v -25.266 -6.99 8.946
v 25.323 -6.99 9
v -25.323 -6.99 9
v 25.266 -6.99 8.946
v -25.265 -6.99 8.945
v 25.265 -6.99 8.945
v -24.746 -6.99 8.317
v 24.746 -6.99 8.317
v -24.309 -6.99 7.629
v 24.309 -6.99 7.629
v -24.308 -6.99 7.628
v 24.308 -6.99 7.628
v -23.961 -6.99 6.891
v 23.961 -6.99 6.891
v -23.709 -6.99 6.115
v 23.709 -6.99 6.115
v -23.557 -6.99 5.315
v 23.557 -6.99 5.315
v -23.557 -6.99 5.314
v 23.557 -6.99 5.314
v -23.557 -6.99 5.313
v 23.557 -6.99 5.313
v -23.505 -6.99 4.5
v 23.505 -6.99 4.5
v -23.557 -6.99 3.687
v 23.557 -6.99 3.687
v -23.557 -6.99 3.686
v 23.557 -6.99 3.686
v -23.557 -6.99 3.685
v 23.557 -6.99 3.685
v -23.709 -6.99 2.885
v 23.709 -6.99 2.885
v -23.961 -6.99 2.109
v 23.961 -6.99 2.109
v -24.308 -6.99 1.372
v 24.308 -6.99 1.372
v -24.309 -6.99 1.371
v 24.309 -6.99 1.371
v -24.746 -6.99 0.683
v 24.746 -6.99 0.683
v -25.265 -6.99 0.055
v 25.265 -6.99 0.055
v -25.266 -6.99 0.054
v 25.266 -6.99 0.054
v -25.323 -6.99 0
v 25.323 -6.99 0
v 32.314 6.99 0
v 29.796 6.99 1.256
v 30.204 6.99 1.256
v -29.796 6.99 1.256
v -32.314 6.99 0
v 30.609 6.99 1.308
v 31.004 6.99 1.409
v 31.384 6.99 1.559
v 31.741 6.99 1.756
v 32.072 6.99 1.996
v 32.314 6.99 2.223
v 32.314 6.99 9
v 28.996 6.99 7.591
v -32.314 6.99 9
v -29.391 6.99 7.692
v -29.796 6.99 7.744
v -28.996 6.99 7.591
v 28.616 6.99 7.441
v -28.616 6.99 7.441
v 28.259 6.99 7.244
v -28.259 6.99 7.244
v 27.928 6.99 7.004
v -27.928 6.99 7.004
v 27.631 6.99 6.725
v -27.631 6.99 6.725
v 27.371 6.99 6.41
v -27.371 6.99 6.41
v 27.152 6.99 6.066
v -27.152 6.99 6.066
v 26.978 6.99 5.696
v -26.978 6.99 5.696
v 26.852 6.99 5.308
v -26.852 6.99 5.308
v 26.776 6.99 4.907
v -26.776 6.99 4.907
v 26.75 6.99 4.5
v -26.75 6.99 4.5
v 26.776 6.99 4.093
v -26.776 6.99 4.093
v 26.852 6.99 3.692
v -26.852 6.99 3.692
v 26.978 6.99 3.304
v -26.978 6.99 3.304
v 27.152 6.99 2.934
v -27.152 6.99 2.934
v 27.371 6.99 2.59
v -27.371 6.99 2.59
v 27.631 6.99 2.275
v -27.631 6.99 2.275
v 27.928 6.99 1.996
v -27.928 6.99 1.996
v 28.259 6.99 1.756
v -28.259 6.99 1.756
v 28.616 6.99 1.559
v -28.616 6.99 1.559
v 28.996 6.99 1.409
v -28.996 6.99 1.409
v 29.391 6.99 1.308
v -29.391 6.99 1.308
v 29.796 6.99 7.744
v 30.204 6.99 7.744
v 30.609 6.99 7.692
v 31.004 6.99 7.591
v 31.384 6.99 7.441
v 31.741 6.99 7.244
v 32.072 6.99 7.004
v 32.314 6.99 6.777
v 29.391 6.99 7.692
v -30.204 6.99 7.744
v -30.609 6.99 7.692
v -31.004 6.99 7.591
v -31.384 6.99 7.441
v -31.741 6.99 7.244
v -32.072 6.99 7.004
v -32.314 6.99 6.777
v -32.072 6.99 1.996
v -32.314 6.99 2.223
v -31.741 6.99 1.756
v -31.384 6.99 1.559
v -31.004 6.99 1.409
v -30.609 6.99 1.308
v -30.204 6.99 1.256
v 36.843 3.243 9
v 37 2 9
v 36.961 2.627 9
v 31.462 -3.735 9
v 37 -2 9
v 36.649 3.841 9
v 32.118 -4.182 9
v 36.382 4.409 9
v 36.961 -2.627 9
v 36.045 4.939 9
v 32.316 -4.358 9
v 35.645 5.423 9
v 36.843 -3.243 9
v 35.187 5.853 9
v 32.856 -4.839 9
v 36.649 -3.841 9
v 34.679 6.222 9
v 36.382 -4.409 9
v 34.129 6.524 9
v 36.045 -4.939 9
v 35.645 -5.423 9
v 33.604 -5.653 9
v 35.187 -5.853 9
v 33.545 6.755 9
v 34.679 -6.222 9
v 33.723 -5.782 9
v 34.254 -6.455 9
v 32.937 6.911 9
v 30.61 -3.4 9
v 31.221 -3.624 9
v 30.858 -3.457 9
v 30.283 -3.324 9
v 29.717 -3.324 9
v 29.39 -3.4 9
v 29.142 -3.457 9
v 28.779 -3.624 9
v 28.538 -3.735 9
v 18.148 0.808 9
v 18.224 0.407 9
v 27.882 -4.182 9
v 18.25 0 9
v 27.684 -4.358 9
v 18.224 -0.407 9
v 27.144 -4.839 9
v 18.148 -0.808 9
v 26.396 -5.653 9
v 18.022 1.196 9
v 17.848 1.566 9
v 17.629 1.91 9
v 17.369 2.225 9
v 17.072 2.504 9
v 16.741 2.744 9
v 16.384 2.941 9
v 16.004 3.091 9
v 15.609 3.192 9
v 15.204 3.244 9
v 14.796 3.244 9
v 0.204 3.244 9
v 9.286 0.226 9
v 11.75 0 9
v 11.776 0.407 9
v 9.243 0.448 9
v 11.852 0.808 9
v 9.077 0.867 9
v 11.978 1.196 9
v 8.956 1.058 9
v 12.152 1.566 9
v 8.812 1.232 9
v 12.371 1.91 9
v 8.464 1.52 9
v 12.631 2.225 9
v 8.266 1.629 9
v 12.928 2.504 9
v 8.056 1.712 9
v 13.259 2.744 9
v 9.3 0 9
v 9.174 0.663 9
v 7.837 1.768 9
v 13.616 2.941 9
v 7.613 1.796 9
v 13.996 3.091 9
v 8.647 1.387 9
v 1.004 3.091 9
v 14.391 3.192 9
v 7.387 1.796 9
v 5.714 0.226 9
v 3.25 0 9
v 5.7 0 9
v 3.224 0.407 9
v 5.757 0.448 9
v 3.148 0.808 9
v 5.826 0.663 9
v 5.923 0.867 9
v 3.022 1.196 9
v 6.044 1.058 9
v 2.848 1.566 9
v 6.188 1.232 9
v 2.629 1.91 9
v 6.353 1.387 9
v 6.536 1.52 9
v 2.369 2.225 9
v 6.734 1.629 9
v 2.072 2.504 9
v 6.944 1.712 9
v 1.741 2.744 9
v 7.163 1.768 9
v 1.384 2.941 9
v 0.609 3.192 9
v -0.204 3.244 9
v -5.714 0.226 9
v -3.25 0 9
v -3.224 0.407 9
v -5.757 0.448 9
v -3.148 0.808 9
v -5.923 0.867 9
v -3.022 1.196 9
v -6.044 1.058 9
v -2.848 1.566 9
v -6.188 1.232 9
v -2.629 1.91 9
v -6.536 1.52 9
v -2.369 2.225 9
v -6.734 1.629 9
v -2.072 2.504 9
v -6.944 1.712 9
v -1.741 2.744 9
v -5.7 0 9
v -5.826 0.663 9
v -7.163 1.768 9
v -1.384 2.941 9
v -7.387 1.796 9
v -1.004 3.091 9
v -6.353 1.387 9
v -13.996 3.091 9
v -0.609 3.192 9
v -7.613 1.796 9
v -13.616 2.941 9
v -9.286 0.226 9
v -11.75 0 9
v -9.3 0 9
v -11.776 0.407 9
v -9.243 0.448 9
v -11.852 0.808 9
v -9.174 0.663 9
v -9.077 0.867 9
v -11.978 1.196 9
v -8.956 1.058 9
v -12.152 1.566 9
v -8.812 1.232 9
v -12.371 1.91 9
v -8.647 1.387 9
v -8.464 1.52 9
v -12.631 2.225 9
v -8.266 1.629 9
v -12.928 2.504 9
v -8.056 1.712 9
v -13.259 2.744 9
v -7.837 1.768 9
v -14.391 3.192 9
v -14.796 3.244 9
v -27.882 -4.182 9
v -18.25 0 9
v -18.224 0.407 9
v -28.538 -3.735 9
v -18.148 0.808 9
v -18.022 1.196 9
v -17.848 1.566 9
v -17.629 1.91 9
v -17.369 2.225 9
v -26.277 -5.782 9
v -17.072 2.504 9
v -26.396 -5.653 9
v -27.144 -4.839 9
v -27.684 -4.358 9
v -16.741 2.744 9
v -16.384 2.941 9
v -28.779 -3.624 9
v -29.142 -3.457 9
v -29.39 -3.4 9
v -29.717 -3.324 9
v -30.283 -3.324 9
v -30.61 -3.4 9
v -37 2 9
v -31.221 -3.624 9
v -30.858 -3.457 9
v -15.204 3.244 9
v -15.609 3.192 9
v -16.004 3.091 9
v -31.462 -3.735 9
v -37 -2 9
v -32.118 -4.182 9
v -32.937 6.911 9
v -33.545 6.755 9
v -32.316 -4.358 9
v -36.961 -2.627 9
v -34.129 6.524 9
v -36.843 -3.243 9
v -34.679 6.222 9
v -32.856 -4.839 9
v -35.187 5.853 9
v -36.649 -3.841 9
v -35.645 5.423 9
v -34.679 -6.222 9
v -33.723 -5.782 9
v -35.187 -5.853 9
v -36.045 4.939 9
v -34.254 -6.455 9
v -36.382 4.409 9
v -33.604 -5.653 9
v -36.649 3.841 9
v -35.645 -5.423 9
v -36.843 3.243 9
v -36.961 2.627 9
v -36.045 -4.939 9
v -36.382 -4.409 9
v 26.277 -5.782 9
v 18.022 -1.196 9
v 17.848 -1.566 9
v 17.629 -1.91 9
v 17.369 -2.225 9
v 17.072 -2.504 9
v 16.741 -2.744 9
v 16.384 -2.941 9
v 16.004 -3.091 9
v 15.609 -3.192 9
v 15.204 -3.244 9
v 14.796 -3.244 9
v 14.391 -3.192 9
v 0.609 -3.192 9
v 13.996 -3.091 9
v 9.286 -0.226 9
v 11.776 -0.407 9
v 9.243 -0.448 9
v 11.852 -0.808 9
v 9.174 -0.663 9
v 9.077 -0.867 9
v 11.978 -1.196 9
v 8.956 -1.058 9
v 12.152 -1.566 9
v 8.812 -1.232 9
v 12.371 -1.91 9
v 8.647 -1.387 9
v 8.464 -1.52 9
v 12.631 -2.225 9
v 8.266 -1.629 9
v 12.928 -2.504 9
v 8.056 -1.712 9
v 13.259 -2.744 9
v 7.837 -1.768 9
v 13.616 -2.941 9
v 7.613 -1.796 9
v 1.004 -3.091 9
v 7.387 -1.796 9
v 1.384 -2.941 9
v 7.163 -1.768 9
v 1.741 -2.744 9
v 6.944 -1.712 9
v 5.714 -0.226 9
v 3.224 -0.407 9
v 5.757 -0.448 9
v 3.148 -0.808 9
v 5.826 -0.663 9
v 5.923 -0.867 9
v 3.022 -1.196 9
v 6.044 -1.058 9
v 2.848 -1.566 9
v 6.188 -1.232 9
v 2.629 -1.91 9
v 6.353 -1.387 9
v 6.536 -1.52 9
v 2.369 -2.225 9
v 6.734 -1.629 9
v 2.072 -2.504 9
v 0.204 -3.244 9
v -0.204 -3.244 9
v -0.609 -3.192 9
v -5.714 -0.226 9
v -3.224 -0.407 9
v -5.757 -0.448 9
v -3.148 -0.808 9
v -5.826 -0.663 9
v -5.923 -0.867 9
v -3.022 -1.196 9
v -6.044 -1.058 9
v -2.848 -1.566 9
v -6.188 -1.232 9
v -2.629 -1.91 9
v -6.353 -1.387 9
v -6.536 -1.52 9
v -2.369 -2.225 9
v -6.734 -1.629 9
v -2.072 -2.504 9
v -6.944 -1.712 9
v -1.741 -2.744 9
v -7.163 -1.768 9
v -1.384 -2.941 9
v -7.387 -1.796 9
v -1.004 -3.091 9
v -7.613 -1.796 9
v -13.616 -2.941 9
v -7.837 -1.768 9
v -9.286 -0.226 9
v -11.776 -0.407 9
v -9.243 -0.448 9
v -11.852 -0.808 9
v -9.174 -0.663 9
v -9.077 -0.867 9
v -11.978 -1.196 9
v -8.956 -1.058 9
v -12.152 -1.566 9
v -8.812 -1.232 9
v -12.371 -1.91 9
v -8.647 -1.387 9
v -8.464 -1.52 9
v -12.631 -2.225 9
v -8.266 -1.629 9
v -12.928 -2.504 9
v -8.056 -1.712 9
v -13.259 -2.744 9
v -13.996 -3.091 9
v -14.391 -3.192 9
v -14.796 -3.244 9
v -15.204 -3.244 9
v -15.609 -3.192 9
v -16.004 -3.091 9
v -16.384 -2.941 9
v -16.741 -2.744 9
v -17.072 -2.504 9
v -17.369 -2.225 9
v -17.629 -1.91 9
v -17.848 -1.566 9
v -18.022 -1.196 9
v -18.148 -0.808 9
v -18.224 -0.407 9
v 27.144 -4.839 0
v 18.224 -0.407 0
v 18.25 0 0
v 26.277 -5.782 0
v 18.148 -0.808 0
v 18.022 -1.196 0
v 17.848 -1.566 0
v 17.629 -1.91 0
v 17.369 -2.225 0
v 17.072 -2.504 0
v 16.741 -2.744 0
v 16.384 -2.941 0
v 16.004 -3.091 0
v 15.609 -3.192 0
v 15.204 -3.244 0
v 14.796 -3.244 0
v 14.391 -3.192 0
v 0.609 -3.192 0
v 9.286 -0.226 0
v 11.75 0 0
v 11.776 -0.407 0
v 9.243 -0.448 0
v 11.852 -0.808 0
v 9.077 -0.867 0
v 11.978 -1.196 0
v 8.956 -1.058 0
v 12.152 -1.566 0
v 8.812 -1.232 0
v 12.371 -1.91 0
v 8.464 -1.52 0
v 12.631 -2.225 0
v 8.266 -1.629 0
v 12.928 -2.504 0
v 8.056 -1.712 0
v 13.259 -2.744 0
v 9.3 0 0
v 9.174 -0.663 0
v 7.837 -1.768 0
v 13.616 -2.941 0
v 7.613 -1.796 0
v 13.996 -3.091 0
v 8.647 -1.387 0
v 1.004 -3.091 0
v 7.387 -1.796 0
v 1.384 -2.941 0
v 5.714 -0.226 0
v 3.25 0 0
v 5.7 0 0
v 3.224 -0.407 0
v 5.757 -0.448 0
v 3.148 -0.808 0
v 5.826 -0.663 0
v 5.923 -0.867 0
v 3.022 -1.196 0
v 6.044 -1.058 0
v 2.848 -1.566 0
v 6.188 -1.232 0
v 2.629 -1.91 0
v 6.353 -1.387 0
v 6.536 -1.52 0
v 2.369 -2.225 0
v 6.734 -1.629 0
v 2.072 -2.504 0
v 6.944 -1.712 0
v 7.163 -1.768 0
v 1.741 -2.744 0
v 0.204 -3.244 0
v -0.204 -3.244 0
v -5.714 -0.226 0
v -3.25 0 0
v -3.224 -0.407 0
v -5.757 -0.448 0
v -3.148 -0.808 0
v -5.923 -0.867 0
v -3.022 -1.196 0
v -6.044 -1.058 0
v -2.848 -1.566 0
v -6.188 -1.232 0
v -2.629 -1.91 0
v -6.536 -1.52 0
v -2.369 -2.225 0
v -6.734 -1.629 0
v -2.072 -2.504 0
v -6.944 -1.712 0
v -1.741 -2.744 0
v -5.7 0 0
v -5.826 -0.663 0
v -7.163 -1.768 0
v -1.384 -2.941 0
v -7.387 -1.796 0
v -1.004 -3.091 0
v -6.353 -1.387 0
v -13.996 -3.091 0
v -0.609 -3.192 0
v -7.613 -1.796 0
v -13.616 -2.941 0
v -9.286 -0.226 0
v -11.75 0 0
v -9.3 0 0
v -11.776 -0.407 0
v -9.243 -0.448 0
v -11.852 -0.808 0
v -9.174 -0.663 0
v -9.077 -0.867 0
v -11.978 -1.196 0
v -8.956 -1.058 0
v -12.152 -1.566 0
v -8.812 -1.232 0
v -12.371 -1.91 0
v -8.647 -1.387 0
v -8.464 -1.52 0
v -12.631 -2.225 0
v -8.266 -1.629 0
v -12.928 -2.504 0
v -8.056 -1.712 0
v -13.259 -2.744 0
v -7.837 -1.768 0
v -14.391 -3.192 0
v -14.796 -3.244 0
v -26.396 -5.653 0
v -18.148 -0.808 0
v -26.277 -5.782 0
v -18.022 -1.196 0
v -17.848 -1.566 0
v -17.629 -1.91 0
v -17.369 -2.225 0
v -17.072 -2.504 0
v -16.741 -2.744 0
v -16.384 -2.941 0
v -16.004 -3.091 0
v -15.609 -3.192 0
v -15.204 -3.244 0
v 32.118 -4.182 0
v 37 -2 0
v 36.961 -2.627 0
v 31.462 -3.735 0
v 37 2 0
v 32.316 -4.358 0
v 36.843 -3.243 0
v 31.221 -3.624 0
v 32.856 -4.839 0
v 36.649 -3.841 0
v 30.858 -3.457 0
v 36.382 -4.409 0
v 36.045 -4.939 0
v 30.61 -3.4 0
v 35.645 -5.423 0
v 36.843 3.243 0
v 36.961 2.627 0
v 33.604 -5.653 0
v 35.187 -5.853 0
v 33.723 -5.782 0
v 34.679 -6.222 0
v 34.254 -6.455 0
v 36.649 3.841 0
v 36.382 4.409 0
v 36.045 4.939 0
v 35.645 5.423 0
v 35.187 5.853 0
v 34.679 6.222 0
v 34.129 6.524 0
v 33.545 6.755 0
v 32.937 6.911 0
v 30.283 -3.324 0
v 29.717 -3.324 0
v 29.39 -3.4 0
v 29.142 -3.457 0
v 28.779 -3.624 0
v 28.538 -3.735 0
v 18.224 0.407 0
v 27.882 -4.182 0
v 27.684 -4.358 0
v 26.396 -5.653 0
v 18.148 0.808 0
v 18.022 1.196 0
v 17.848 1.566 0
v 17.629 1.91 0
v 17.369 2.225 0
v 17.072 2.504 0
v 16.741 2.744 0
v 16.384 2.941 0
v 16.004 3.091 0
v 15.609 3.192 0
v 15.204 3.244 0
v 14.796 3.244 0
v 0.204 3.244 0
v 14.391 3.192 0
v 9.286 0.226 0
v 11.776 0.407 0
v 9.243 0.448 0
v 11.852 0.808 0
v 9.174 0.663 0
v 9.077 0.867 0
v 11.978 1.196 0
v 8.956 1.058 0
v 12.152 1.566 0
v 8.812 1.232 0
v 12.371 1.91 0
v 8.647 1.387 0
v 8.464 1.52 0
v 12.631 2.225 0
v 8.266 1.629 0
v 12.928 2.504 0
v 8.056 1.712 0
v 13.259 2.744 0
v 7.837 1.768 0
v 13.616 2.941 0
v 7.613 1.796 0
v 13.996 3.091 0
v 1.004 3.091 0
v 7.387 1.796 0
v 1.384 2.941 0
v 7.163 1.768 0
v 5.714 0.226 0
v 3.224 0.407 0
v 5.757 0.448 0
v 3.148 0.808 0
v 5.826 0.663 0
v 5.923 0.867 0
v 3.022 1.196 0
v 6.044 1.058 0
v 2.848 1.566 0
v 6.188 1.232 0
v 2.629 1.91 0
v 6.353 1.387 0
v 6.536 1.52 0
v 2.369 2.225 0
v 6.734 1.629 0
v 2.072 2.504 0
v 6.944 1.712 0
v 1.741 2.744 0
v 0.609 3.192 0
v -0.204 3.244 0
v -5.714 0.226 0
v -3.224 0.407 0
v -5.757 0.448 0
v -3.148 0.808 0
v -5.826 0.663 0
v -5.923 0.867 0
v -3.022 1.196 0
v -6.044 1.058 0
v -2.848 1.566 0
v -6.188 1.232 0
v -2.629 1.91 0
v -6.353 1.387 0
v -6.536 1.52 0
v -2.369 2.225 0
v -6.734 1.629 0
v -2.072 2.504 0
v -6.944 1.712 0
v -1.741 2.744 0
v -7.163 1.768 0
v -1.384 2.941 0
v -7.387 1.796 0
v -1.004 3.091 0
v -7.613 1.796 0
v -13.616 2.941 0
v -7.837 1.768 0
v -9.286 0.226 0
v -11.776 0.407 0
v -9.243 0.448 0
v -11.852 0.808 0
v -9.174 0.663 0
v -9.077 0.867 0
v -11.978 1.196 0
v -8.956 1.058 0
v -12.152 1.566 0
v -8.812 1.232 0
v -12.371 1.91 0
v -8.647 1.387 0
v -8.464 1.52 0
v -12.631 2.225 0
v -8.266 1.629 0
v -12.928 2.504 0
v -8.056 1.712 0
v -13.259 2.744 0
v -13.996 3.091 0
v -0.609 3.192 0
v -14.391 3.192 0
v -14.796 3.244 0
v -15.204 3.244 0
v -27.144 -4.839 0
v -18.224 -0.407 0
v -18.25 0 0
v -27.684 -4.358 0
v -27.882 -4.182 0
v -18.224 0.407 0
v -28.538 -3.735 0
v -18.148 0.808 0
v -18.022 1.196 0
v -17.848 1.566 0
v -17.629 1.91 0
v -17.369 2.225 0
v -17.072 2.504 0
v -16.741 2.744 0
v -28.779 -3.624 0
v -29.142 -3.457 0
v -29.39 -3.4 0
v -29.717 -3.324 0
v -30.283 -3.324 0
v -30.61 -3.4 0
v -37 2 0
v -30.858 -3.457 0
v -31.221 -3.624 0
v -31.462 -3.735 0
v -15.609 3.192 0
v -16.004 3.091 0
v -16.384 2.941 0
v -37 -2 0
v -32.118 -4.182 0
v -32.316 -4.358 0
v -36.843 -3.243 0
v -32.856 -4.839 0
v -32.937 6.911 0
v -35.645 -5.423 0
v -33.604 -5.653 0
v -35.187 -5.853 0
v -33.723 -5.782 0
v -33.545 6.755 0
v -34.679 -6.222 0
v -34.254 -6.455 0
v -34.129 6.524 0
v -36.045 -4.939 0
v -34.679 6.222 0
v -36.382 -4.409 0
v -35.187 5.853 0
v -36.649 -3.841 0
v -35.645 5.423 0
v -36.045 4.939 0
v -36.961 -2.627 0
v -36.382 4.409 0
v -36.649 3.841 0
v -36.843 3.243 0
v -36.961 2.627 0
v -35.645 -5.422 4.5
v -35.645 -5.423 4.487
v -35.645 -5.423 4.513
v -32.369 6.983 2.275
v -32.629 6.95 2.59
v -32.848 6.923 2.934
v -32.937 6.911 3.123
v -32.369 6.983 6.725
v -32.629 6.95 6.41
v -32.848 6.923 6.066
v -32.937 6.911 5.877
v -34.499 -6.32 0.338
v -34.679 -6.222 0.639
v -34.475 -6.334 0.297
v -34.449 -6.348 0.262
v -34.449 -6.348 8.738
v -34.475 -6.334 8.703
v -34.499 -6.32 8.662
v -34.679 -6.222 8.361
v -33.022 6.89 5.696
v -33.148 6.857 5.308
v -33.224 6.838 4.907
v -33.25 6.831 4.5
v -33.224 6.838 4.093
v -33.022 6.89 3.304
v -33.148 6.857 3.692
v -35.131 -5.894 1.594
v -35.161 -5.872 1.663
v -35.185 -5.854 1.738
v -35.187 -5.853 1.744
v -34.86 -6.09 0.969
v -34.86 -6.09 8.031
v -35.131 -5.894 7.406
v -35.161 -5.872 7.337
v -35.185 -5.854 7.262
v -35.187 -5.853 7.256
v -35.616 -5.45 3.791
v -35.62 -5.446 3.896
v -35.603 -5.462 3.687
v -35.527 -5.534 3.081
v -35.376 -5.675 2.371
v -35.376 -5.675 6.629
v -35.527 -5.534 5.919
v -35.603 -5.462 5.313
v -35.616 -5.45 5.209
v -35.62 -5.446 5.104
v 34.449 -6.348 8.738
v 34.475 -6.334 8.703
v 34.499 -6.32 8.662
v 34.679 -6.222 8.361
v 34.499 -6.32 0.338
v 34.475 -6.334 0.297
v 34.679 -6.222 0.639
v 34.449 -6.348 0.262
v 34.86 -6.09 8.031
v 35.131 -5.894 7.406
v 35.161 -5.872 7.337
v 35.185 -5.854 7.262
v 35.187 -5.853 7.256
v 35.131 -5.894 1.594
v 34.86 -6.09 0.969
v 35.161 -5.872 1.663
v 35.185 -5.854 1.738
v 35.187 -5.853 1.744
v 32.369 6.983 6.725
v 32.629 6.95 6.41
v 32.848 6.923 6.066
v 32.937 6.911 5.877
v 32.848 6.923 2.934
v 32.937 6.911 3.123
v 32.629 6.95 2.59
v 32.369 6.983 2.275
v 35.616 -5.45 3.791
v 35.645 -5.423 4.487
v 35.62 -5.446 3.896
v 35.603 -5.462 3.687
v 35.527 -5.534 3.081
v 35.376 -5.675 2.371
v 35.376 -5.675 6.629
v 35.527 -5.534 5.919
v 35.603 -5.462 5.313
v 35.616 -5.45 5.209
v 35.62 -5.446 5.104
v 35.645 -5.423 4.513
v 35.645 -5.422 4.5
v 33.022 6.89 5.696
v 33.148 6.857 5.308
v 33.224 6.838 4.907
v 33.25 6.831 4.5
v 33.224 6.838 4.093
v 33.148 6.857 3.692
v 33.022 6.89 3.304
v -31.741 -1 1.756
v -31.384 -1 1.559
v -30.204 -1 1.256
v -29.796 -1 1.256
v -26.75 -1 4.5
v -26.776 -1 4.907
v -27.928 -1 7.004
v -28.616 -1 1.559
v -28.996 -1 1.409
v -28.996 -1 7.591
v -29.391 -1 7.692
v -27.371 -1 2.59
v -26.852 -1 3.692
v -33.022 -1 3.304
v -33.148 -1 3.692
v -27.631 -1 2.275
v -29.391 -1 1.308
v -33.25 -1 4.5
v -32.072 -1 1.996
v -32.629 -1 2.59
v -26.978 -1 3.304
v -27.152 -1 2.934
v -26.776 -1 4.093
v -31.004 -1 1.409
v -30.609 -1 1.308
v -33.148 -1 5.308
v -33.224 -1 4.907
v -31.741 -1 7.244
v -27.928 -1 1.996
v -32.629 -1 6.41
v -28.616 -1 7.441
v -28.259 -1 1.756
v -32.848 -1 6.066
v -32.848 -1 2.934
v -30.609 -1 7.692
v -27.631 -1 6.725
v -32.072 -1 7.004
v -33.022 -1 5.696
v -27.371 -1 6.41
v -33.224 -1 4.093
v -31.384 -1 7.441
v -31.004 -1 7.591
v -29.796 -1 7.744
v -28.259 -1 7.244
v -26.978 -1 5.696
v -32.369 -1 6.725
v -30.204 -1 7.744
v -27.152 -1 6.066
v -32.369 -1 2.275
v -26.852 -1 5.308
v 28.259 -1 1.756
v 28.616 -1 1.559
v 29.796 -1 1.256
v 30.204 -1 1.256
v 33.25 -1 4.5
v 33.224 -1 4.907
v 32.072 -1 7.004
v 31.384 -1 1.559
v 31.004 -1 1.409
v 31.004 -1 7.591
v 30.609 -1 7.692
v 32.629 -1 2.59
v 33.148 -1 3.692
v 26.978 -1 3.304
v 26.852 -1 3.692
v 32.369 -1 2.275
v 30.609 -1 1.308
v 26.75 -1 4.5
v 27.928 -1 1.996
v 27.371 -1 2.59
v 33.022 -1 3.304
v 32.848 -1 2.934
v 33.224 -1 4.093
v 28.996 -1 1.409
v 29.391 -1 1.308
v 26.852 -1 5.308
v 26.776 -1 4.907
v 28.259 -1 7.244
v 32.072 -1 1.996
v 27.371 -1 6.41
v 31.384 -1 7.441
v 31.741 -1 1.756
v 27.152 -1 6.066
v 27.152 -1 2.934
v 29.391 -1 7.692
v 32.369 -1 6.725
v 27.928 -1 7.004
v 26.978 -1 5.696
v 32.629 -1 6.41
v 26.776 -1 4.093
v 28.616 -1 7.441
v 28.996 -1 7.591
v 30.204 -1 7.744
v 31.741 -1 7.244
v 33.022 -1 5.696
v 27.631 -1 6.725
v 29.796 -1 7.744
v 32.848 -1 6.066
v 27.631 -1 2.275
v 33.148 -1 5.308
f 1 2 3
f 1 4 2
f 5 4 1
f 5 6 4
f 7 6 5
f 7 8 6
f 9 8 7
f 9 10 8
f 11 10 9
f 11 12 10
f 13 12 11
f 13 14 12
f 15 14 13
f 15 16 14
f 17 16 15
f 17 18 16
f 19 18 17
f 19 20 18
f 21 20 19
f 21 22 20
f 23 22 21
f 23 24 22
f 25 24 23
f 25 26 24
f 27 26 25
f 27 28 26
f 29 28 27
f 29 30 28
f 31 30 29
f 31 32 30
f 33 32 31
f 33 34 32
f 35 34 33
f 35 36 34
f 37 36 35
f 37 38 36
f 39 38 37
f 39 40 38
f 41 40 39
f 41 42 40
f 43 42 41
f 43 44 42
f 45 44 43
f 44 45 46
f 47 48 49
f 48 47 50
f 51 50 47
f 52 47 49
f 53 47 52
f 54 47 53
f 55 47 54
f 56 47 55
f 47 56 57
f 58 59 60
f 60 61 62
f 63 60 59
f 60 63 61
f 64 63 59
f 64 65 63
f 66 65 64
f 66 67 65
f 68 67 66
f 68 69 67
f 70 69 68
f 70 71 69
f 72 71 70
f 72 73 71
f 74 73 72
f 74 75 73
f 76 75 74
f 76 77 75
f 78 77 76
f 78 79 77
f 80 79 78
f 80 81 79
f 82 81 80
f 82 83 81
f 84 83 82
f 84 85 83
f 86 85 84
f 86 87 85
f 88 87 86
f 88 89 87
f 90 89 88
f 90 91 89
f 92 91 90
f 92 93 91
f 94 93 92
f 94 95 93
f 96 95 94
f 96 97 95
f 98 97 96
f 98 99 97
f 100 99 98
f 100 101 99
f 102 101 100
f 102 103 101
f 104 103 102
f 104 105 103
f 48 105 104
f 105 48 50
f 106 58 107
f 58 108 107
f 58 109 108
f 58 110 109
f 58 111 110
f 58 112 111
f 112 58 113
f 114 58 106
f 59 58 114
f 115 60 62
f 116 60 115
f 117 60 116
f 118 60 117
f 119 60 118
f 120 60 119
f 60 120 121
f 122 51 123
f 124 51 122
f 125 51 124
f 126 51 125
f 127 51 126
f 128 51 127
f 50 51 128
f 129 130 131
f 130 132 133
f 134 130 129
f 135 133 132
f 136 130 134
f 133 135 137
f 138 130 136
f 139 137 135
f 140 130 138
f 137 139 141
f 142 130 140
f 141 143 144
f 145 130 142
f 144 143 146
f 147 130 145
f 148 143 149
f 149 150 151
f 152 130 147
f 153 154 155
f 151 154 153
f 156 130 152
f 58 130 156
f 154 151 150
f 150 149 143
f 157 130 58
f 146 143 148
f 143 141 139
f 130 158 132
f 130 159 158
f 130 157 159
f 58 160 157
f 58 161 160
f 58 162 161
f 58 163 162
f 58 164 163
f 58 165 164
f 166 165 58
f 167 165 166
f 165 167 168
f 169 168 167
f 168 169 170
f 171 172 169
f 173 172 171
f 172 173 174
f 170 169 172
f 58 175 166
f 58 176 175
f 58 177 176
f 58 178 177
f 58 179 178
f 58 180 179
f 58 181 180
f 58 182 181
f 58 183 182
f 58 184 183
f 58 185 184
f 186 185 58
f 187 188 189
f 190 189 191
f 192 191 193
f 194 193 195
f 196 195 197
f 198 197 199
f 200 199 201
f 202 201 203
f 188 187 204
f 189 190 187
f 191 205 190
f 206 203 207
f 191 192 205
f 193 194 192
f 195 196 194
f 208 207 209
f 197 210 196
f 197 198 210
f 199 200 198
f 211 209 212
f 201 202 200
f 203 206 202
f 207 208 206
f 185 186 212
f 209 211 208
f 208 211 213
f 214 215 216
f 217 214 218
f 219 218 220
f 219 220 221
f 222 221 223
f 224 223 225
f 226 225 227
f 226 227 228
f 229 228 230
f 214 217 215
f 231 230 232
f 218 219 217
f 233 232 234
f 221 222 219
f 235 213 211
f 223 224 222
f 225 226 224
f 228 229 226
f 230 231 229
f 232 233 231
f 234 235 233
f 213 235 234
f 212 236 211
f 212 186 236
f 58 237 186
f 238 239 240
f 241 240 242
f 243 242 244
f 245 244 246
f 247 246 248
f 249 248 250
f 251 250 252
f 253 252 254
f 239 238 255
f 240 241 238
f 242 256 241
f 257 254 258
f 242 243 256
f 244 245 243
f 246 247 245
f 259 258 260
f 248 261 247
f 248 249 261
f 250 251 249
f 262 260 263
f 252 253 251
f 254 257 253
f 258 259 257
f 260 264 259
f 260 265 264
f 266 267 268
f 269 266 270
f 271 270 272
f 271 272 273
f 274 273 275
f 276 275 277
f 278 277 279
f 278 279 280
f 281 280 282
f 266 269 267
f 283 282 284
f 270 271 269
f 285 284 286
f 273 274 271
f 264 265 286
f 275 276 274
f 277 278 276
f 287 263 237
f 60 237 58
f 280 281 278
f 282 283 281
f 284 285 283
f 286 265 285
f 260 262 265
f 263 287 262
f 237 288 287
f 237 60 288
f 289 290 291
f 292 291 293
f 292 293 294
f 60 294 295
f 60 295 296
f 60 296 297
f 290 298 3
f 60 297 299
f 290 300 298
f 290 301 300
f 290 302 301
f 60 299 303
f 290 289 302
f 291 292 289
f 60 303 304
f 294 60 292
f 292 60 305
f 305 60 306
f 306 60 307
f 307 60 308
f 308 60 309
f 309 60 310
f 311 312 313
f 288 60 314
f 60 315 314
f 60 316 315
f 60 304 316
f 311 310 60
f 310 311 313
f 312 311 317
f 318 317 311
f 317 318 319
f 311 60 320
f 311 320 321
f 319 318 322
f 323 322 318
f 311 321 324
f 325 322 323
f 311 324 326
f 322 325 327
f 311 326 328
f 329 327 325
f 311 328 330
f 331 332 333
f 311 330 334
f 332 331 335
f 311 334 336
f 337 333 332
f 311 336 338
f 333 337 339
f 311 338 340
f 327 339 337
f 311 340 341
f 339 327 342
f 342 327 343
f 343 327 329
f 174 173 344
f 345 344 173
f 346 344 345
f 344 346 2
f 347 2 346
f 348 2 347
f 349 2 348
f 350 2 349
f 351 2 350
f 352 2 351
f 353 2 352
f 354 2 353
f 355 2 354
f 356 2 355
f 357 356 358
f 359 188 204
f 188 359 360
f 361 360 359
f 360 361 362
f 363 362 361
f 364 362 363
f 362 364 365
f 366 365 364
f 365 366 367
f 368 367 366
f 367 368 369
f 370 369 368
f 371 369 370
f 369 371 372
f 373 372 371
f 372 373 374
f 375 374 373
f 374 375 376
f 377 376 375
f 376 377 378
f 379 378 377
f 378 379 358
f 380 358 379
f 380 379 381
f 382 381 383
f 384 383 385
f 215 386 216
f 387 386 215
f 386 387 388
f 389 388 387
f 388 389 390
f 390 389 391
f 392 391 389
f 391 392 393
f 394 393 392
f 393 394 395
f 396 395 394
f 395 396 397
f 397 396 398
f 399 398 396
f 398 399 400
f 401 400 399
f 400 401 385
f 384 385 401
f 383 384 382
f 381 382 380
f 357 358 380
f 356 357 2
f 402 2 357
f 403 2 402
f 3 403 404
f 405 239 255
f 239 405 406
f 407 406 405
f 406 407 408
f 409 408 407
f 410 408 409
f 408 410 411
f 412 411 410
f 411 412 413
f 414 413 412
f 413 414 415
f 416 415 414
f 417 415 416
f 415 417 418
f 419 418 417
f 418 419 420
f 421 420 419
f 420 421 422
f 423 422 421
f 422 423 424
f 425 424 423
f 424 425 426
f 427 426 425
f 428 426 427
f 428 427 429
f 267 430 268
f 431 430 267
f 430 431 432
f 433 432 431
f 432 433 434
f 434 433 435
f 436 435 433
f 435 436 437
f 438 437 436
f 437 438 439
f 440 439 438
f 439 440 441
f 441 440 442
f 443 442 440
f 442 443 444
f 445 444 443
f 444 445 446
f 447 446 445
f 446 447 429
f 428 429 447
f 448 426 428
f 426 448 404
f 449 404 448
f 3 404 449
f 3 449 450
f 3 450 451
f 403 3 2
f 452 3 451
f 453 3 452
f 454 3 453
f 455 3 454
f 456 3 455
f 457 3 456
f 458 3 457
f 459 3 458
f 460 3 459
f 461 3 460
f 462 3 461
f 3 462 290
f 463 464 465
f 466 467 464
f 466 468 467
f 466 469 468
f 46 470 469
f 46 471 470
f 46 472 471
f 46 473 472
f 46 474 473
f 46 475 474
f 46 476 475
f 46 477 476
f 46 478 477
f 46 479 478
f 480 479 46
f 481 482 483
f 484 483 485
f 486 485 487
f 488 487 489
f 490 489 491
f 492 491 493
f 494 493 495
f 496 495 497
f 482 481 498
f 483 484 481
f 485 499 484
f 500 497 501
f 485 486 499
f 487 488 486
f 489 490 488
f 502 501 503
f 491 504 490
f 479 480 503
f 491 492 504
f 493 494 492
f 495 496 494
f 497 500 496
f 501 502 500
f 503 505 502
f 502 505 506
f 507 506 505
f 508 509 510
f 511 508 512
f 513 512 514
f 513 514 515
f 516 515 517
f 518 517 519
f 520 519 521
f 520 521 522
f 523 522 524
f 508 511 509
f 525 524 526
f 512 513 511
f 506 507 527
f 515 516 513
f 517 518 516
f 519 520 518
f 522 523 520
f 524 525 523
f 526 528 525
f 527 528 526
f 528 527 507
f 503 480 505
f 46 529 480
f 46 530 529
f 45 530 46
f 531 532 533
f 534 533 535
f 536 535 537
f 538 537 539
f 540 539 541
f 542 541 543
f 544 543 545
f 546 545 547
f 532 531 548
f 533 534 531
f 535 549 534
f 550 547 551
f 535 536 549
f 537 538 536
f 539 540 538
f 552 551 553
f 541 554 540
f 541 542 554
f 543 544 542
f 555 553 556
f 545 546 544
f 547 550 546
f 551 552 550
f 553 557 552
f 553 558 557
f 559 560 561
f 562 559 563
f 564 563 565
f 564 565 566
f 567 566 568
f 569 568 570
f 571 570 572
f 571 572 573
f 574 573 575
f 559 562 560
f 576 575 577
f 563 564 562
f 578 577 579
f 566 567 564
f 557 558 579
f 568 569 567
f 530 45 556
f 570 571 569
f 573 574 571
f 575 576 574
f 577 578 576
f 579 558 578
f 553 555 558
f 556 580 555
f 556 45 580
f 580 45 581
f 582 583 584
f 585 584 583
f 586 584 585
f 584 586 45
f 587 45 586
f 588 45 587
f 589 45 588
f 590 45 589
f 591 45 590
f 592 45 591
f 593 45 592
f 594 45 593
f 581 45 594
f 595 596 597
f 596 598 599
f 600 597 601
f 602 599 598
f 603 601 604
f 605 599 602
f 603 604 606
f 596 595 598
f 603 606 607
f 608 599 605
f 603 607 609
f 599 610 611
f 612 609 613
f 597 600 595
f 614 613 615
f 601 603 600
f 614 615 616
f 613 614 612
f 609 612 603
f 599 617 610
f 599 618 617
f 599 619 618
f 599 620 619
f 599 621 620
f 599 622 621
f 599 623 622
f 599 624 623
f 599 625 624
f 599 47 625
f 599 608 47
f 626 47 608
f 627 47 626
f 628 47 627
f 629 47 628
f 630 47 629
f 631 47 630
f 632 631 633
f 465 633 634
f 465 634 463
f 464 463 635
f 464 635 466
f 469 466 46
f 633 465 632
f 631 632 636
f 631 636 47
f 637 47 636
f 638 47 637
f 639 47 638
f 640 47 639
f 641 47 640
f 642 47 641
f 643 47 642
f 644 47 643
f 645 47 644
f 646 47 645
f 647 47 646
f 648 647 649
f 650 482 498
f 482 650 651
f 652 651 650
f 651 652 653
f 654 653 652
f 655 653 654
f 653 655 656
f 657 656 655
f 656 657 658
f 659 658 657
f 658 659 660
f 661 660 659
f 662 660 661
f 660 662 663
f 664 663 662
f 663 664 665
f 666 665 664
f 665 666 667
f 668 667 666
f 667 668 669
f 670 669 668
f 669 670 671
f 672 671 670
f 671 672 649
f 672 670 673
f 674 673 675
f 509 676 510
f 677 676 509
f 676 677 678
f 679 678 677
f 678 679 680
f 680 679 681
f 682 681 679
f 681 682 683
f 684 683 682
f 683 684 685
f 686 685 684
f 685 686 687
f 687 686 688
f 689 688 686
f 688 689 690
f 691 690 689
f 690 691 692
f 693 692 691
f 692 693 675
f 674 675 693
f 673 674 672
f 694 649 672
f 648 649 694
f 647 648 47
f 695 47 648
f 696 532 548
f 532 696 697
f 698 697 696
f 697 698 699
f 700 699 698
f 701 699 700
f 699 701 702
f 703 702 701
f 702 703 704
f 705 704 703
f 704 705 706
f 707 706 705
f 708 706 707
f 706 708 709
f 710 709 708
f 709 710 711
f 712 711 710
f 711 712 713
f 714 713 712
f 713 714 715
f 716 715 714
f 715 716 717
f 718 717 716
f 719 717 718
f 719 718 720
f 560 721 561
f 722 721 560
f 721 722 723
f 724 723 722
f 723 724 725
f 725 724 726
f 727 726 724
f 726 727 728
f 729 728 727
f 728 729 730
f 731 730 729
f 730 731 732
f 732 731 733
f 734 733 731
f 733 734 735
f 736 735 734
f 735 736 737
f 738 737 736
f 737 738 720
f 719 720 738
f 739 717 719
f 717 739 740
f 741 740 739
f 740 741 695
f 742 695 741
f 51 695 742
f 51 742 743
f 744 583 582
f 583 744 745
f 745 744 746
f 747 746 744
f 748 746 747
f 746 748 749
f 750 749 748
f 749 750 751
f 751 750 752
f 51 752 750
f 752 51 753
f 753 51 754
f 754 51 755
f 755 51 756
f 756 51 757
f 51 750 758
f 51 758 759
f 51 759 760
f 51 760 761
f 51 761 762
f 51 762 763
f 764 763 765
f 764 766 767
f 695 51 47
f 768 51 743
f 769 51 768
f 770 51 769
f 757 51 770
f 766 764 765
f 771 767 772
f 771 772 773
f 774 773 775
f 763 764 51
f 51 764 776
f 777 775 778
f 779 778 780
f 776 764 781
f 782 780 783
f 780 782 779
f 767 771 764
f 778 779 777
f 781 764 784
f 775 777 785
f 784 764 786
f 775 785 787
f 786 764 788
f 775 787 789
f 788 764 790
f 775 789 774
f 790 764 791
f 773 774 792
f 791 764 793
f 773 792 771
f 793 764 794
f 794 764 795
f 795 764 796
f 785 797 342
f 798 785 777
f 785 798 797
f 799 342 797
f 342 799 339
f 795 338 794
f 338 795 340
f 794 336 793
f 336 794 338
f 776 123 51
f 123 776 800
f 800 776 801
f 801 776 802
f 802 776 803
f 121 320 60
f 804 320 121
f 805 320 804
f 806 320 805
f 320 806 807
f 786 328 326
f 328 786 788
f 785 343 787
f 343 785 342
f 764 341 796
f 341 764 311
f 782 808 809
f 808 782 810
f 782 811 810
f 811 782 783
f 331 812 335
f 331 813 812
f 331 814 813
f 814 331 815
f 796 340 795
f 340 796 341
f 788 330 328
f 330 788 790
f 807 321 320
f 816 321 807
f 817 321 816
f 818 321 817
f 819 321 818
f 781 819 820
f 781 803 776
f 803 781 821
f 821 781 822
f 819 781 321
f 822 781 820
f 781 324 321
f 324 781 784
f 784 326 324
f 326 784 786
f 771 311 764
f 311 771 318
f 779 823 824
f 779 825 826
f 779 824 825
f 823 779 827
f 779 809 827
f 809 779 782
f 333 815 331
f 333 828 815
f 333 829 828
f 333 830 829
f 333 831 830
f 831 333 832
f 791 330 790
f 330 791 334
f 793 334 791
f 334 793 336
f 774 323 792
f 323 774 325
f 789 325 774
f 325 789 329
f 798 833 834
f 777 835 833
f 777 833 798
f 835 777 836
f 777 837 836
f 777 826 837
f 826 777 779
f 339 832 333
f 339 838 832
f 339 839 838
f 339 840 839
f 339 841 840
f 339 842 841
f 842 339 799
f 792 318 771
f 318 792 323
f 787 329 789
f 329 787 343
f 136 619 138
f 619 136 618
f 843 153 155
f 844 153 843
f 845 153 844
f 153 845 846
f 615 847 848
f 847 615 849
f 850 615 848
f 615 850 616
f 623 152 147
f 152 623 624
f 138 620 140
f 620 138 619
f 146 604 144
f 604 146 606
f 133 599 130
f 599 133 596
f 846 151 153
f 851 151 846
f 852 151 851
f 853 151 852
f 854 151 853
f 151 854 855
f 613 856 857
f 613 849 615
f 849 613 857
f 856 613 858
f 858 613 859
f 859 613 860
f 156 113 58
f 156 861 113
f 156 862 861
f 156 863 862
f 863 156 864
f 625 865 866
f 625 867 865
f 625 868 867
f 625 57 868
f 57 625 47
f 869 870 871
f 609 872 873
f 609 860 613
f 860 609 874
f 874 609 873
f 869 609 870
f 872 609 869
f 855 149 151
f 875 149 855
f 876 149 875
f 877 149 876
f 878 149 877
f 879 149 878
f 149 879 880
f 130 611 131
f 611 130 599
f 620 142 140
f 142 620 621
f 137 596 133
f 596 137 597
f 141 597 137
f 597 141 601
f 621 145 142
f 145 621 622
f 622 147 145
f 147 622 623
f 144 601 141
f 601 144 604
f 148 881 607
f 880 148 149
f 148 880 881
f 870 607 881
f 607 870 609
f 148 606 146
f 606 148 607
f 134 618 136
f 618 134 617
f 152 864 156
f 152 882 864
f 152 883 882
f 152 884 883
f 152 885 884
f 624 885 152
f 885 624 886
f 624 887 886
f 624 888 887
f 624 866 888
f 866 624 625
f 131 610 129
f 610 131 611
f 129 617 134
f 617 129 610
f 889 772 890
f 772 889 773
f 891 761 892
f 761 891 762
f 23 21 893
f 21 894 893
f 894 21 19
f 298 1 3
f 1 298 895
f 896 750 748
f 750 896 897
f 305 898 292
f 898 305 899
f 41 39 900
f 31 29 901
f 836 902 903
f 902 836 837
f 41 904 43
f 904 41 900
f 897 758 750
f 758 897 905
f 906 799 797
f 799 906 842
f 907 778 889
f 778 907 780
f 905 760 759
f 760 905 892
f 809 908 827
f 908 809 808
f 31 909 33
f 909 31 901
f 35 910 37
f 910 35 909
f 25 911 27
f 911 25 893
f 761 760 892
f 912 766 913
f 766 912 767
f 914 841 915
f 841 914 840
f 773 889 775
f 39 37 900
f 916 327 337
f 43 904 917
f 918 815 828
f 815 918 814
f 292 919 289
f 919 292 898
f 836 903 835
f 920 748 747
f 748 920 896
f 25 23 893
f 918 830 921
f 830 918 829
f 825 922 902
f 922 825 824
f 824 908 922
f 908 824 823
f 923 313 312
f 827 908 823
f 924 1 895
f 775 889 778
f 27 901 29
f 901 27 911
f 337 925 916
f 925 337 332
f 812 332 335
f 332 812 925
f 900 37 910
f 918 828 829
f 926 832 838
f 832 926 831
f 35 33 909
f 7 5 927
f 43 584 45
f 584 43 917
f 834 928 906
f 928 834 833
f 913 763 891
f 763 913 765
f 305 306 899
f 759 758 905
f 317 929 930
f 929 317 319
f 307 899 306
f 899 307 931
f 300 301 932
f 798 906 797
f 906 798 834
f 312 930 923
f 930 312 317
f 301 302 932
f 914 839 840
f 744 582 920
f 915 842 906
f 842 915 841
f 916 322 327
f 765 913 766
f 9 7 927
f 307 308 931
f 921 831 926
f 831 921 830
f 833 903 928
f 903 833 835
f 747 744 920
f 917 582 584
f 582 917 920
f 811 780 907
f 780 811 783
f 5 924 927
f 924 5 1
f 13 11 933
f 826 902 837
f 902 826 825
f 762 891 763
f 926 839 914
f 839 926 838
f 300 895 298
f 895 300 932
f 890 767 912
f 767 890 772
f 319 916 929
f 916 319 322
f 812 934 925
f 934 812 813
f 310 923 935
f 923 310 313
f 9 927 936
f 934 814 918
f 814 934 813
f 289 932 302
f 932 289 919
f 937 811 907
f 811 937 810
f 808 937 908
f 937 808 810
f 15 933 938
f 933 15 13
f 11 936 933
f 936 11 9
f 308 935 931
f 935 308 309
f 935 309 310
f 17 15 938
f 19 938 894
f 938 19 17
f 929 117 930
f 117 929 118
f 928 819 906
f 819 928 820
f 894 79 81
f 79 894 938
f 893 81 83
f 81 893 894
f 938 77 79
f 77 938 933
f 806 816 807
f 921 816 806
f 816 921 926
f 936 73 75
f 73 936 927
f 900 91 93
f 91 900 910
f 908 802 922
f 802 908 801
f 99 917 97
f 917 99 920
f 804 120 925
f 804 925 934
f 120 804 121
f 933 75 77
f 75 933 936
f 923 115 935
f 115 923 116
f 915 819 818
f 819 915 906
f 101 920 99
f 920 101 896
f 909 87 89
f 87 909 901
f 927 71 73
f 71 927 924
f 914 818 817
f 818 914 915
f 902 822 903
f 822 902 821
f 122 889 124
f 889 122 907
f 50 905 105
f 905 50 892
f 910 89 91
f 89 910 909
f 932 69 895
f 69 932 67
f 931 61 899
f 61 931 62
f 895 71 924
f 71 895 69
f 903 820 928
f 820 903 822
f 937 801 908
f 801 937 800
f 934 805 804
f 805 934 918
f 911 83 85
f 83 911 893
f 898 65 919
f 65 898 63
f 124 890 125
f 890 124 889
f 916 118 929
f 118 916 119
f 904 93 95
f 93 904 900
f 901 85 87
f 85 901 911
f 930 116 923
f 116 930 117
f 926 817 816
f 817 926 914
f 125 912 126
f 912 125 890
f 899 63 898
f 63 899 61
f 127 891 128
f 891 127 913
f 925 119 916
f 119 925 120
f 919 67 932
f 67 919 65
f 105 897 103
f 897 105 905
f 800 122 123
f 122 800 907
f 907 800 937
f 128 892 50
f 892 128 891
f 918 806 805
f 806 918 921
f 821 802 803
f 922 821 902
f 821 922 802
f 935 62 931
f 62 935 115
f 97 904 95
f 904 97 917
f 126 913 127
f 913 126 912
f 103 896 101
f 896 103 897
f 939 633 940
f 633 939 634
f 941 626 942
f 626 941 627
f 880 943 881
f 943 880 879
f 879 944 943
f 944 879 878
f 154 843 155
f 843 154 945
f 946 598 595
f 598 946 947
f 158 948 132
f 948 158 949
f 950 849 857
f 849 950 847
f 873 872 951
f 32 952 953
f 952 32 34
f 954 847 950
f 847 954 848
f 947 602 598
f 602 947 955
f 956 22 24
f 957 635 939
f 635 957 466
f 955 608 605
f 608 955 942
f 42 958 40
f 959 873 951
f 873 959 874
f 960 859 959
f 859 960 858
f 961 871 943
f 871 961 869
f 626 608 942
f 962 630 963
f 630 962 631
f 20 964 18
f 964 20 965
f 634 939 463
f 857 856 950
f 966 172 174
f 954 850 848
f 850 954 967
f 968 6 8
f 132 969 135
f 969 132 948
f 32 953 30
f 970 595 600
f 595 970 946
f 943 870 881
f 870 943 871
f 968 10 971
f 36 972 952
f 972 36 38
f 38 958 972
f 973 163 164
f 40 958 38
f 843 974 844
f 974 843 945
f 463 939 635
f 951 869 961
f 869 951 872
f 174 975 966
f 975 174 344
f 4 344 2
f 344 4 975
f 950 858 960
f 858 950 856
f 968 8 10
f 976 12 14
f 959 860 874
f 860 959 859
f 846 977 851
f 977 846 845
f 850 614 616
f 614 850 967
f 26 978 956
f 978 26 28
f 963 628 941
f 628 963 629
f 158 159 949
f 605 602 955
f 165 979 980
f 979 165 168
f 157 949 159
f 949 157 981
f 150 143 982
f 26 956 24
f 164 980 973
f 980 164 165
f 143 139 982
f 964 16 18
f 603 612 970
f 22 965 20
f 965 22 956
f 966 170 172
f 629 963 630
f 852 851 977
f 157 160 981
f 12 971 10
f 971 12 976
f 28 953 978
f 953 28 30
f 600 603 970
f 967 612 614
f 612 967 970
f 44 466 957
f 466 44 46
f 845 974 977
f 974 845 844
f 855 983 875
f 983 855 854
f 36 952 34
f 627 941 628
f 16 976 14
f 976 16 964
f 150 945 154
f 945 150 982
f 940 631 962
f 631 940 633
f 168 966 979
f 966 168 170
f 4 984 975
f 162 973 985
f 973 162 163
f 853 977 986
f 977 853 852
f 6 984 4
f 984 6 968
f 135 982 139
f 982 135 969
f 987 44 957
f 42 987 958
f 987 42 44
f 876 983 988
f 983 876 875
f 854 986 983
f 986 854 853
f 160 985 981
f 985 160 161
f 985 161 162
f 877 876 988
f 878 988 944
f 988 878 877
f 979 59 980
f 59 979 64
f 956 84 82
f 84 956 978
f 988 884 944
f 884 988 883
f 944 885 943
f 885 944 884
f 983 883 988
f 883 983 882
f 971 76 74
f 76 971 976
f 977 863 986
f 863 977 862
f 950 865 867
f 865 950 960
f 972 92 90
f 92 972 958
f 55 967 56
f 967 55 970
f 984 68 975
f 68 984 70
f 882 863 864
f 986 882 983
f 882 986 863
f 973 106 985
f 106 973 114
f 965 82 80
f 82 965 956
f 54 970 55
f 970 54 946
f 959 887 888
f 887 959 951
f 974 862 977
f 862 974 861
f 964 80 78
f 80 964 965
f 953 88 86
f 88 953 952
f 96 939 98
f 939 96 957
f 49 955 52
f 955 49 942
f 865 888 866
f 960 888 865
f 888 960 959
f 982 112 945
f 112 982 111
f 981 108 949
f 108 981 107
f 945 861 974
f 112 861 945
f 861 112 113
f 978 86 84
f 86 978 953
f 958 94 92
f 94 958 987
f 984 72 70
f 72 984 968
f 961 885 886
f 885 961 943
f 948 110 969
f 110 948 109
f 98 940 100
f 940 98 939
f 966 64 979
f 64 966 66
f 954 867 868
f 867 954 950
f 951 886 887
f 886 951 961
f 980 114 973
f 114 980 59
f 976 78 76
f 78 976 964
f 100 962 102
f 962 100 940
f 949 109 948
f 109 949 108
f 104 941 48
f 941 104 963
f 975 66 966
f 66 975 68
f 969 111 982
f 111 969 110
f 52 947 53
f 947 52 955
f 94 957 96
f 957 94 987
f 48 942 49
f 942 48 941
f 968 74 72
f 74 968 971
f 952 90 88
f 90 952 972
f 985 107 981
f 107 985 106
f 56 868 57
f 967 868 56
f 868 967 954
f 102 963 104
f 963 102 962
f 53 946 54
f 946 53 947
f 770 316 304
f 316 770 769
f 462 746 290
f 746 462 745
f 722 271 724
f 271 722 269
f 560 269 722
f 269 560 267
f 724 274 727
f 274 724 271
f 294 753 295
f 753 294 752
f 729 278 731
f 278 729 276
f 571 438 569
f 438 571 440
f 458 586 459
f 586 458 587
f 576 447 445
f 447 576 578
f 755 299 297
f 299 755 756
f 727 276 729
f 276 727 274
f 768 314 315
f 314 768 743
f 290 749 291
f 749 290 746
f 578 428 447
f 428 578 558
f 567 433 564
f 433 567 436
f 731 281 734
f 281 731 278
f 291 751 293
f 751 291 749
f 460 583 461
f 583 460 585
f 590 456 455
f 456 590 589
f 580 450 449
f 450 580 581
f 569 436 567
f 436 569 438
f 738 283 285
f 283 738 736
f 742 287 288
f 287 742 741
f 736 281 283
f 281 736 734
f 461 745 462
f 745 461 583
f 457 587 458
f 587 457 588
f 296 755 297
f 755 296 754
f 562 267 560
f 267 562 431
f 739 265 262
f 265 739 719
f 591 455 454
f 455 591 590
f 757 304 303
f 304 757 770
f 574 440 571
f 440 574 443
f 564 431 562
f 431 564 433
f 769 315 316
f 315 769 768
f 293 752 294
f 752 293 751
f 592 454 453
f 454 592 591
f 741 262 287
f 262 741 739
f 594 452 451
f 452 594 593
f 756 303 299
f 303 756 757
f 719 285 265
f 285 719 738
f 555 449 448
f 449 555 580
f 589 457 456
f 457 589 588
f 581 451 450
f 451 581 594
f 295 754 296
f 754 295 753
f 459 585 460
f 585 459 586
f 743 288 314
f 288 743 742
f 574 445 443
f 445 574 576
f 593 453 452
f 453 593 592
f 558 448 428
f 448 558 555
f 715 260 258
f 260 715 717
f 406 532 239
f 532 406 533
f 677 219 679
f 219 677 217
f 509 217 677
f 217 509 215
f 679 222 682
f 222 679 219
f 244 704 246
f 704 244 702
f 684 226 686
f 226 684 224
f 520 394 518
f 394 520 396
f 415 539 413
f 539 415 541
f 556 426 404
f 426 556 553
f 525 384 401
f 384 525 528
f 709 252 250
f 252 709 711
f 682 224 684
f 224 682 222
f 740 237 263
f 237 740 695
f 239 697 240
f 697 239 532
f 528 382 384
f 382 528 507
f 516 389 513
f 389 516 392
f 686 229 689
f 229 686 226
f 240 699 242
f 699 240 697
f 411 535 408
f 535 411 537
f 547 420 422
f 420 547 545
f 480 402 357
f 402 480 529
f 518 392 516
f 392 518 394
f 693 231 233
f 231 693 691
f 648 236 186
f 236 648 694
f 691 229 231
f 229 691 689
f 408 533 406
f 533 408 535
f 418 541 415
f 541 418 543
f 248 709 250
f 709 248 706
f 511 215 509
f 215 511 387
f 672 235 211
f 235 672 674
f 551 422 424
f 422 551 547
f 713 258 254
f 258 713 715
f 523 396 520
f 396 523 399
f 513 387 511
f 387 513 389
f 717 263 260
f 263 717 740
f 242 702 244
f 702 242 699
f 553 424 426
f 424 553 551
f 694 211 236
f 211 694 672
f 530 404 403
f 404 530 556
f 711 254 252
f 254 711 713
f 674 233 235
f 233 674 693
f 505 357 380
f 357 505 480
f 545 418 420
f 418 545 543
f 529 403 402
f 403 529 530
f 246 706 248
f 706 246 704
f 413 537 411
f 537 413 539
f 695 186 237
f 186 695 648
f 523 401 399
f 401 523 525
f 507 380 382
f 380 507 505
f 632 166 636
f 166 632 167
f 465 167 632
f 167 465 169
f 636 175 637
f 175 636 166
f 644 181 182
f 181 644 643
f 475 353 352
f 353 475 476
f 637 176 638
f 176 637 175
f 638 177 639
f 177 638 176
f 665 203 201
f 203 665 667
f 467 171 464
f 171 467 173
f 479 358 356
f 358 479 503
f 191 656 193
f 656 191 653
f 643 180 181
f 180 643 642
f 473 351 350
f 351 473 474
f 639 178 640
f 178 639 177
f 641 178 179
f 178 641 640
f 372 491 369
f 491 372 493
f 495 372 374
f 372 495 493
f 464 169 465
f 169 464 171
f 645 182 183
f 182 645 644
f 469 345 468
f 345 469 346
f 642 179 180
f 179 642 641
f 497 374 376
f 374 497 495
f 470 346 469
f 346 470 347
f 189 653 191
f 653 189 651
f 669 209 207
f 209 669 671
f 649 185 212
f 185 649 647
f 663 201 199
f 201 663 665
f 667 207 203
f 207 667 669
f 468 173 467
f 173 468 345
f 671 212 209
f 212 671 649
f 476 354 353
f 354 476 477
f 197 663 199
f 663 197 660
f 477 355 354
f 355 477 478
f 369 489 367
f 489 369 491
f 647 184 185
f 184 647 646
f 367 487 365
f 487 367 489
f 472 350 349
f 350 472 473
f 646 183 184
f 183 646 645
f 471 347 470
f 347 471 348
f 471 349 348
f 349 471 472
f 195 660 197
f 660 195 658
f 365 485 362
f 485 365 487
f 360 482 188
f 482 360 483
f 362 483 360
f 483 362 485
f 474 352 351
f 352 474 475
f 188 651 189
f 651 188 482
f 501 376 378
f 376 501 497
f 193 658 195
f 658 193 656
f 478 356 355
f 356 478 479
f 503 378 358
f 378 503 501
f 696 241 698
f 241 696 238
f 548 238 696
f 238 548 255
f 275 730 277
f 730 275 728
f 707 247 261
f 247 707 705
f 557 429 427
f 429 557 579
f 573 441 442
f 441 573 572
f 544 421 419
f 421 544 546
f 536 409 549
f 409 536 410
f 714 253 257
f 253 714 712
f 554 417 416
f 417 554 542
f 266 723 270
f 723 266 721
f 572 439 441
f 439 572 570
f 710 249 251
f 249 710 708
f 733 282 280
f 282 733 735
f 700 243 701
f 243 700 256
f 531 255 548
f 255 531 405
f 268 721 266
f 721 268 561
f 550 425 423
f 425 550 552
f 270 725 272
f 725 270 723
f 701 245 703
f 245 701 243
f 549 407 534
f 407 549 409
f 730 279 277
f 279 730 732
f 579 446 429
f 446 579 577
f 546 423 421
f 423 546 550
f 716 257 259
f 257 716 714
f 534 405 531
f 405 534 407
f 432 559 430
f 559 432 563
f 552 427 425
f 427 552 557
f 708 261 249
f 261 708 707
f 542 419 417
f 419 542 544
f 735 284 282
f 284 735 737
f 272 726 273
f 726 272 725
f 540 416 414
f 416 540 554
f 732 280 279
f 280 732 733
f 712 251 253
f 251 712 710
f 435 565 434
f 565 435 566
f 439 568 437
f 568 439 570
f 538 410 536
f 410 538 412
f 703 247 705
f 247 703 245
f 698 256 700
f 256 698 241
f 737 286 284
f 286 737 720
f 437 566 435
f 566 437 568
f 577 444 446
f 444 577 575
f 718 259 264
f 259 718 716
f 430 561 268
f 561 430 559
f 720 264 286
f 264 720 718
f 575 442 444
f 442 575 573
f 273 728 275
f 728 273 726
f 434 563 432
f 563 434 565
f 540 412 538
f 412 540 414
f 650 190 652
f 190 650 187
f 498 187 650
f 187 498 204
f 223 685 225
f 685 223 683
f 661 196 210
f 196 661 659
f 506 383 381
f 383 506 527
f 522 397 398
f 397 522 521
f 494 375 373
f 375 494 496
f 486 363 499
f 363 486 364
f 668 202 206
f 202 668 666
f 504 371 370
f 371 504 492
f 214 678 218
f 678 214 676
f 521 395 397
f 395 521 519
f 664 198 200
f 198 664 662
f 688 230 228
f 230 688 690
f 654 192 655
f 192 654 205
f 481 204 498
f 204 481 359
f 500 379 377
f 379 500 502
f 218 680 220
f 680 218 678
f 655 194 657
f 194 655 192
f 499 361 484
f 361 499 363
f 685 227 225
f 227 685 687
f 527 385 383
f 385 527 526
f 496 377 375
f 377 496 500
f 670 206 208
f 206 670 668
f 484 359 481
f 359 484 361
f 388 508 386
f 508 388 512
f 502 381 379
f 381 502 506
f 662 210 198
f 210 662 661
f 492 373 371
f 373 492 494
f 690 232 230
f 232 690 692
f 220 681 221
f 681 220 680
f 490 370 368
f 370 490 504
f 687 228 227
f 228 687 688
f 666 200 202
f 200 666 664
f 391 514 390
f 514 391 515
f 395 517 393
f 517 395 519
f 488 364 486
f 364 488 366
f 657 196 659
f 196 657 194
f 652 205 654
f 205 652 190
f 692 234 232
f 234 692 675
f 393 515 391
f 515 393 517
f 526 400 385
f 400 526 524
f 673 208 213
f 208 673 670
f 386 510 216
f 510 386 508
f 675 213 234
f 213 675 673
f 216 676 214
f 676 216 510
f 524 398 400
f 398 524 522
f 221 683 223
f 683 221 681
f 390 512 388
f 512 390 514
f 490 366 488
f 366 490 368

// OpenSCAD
$fn = 50;


difference() {
	union() {
		hull() {
			translate(v = [-17.0000000000, 2.0000000000, 0]) {
				cylinder(h = 9, r = 5);
			}
			translate(v = [17.0000000000, 2.0000000000, 0]) {
				cylinder(h = 9, r = 5);
			}
			translate(v = [-17.0000000000, -2.0000000000, 0]) {
				cylinder(h = 9, r = 5);
			}
			translate(v = [17.0000000000, -2.0000000000, 0]) {
				cylinder(h = 9, r = 5);
			}
		}
		translate(v = [-22.5000000000, 0.0000000000, 0]) {
			hull() {
				translate(v = [-9.5000000000, 2.0000000000, 0]) {
					cylinder(h = 9, r = 5);
				}
				translate(v = [9.5000000000, 2.0000000000, 0]) {
					cylinder(h = 9, r = 5);
				}
				translate(v = [-9.5000000000, -2.0000000000, 0]) {
					cylinder(h = 9, r = 5);
				}
				translate(v = [9.5000000000, -2.0000000000, 0]) {
					cylinder(h = 9, r = 5);
				}
			}
		}
		translate(v = [22.5000000000, 0.0000000000, 0]) {
			hull() {
				translate(v = [-9.5000000000, 2.0000000000, 0]) {
					cylinder(h = 9, r = 5);
				}
				translate(v = [9.5000000000, 2.0000000000, 0]) {
					cylinder(h = 9, r = 5);
				}
				translate(v = [-9.5000000000, -2.0000000000, 0]) {
					cylinder(h = 9, r = 5);
				}
				translate(v = [9.5000000000, -2.0000000000, 0]) {
					cylinder(h = 9, r = 5);
				}
			}
		}
	}
	union() {
		translate(v = [-30.0000000000, -7.0000000000, 4.5000000000]) {
			rotate(a = [90, 0, 0]) {
				difference() {
					union() {
						#translate(v = [0, 0, -14.0000000000]) {
							cylinder(h = 14, r = 2.2500000000);
						}
						#translate(v = [0, 0, -6]) {
							cylinder(h = 6, r1 = 3.2500000000, r2 = 6.5000000000);
						}
						#translate(v = [0, 0, -14.0000000000]) {
							cylinder(h = 14, r = 3.2500000000);
						}
						#translate(v = [0, 0, -14.0000000000]) {
							cylinder(h = 14, r = 2.2500000000);
						}
					}
					union();
				}
			}
		}
		translate(v = [30.0000000000, -7.0000000000, 4.5000000000]) {
			rotate(a = [90, 0, 0]) {
				difference() {
					union() {
						#translate(v = [0, 0, -14.0000000000]) {
							cylinder(h = 14, r = 2.2500000000);
						}
						#translate(v = [0, 0, -6]) {
							cylinder(h = 6, r1 = 3.2500000000, r2 = 6.5000000000);
						}
						#translate(v = [0, 0, -14.0000000000]) {
							cylinder(h = 14, r = 3.2500000000);
						}
						#translate(v = [0, 0, -14.0000000000]) {
							cylinder(h = 14, r = 2.2500000000);
						}
					}
					union();
				}
			}
		}
		translate(v = [-15.0000000000, 0.0000000000, 0]) {
			translate(v = [0, 0, -100]) {
				cylinder(h = 200, r = 3.2500000000);
			}
		}
		translate(v = [0, 0, -100]) {
			cylinder(h = 200, r = 3.2500000000);
		}
		translate(v = [15.0000000000, 0.0000000000, 0]) {
			translate(v = [0, 0, -100]) {
				cylinder(h = 200, r = 3.2500000000);
			}
		}
		translate(v = [-15.0000000000, 0.0000000000, 0]) {
			translate(v = [0, 0, -100]) {
				cylinder(h = 200, r = 1.8000000000);
			}
		}
		translate(v = [-7.5000000000, 0.0000000000, 0]) {
			translate(v = [0, 0, -100]) {
				cylinder(h = 200, r = 1.8000000000);
			}
		}
		translate(v = [0, 0, -100]) {
			cylinder(h = 200, r = 1.8000000000);
		}
		translate(v = [7.5000000000, 0.0000000000, 0]) {
			translate(v = [0, 0, -100]) {
				cylinder(h = 200, r = 1.8000000000);
			}
		}
		translate(v = [15.0000000000, 0.0000000000, 0]) {
			translate(v = [0, 0, -100]) {
				cylinder(h = 200, r = 1.8000000000);
			}
		}
	}
}
